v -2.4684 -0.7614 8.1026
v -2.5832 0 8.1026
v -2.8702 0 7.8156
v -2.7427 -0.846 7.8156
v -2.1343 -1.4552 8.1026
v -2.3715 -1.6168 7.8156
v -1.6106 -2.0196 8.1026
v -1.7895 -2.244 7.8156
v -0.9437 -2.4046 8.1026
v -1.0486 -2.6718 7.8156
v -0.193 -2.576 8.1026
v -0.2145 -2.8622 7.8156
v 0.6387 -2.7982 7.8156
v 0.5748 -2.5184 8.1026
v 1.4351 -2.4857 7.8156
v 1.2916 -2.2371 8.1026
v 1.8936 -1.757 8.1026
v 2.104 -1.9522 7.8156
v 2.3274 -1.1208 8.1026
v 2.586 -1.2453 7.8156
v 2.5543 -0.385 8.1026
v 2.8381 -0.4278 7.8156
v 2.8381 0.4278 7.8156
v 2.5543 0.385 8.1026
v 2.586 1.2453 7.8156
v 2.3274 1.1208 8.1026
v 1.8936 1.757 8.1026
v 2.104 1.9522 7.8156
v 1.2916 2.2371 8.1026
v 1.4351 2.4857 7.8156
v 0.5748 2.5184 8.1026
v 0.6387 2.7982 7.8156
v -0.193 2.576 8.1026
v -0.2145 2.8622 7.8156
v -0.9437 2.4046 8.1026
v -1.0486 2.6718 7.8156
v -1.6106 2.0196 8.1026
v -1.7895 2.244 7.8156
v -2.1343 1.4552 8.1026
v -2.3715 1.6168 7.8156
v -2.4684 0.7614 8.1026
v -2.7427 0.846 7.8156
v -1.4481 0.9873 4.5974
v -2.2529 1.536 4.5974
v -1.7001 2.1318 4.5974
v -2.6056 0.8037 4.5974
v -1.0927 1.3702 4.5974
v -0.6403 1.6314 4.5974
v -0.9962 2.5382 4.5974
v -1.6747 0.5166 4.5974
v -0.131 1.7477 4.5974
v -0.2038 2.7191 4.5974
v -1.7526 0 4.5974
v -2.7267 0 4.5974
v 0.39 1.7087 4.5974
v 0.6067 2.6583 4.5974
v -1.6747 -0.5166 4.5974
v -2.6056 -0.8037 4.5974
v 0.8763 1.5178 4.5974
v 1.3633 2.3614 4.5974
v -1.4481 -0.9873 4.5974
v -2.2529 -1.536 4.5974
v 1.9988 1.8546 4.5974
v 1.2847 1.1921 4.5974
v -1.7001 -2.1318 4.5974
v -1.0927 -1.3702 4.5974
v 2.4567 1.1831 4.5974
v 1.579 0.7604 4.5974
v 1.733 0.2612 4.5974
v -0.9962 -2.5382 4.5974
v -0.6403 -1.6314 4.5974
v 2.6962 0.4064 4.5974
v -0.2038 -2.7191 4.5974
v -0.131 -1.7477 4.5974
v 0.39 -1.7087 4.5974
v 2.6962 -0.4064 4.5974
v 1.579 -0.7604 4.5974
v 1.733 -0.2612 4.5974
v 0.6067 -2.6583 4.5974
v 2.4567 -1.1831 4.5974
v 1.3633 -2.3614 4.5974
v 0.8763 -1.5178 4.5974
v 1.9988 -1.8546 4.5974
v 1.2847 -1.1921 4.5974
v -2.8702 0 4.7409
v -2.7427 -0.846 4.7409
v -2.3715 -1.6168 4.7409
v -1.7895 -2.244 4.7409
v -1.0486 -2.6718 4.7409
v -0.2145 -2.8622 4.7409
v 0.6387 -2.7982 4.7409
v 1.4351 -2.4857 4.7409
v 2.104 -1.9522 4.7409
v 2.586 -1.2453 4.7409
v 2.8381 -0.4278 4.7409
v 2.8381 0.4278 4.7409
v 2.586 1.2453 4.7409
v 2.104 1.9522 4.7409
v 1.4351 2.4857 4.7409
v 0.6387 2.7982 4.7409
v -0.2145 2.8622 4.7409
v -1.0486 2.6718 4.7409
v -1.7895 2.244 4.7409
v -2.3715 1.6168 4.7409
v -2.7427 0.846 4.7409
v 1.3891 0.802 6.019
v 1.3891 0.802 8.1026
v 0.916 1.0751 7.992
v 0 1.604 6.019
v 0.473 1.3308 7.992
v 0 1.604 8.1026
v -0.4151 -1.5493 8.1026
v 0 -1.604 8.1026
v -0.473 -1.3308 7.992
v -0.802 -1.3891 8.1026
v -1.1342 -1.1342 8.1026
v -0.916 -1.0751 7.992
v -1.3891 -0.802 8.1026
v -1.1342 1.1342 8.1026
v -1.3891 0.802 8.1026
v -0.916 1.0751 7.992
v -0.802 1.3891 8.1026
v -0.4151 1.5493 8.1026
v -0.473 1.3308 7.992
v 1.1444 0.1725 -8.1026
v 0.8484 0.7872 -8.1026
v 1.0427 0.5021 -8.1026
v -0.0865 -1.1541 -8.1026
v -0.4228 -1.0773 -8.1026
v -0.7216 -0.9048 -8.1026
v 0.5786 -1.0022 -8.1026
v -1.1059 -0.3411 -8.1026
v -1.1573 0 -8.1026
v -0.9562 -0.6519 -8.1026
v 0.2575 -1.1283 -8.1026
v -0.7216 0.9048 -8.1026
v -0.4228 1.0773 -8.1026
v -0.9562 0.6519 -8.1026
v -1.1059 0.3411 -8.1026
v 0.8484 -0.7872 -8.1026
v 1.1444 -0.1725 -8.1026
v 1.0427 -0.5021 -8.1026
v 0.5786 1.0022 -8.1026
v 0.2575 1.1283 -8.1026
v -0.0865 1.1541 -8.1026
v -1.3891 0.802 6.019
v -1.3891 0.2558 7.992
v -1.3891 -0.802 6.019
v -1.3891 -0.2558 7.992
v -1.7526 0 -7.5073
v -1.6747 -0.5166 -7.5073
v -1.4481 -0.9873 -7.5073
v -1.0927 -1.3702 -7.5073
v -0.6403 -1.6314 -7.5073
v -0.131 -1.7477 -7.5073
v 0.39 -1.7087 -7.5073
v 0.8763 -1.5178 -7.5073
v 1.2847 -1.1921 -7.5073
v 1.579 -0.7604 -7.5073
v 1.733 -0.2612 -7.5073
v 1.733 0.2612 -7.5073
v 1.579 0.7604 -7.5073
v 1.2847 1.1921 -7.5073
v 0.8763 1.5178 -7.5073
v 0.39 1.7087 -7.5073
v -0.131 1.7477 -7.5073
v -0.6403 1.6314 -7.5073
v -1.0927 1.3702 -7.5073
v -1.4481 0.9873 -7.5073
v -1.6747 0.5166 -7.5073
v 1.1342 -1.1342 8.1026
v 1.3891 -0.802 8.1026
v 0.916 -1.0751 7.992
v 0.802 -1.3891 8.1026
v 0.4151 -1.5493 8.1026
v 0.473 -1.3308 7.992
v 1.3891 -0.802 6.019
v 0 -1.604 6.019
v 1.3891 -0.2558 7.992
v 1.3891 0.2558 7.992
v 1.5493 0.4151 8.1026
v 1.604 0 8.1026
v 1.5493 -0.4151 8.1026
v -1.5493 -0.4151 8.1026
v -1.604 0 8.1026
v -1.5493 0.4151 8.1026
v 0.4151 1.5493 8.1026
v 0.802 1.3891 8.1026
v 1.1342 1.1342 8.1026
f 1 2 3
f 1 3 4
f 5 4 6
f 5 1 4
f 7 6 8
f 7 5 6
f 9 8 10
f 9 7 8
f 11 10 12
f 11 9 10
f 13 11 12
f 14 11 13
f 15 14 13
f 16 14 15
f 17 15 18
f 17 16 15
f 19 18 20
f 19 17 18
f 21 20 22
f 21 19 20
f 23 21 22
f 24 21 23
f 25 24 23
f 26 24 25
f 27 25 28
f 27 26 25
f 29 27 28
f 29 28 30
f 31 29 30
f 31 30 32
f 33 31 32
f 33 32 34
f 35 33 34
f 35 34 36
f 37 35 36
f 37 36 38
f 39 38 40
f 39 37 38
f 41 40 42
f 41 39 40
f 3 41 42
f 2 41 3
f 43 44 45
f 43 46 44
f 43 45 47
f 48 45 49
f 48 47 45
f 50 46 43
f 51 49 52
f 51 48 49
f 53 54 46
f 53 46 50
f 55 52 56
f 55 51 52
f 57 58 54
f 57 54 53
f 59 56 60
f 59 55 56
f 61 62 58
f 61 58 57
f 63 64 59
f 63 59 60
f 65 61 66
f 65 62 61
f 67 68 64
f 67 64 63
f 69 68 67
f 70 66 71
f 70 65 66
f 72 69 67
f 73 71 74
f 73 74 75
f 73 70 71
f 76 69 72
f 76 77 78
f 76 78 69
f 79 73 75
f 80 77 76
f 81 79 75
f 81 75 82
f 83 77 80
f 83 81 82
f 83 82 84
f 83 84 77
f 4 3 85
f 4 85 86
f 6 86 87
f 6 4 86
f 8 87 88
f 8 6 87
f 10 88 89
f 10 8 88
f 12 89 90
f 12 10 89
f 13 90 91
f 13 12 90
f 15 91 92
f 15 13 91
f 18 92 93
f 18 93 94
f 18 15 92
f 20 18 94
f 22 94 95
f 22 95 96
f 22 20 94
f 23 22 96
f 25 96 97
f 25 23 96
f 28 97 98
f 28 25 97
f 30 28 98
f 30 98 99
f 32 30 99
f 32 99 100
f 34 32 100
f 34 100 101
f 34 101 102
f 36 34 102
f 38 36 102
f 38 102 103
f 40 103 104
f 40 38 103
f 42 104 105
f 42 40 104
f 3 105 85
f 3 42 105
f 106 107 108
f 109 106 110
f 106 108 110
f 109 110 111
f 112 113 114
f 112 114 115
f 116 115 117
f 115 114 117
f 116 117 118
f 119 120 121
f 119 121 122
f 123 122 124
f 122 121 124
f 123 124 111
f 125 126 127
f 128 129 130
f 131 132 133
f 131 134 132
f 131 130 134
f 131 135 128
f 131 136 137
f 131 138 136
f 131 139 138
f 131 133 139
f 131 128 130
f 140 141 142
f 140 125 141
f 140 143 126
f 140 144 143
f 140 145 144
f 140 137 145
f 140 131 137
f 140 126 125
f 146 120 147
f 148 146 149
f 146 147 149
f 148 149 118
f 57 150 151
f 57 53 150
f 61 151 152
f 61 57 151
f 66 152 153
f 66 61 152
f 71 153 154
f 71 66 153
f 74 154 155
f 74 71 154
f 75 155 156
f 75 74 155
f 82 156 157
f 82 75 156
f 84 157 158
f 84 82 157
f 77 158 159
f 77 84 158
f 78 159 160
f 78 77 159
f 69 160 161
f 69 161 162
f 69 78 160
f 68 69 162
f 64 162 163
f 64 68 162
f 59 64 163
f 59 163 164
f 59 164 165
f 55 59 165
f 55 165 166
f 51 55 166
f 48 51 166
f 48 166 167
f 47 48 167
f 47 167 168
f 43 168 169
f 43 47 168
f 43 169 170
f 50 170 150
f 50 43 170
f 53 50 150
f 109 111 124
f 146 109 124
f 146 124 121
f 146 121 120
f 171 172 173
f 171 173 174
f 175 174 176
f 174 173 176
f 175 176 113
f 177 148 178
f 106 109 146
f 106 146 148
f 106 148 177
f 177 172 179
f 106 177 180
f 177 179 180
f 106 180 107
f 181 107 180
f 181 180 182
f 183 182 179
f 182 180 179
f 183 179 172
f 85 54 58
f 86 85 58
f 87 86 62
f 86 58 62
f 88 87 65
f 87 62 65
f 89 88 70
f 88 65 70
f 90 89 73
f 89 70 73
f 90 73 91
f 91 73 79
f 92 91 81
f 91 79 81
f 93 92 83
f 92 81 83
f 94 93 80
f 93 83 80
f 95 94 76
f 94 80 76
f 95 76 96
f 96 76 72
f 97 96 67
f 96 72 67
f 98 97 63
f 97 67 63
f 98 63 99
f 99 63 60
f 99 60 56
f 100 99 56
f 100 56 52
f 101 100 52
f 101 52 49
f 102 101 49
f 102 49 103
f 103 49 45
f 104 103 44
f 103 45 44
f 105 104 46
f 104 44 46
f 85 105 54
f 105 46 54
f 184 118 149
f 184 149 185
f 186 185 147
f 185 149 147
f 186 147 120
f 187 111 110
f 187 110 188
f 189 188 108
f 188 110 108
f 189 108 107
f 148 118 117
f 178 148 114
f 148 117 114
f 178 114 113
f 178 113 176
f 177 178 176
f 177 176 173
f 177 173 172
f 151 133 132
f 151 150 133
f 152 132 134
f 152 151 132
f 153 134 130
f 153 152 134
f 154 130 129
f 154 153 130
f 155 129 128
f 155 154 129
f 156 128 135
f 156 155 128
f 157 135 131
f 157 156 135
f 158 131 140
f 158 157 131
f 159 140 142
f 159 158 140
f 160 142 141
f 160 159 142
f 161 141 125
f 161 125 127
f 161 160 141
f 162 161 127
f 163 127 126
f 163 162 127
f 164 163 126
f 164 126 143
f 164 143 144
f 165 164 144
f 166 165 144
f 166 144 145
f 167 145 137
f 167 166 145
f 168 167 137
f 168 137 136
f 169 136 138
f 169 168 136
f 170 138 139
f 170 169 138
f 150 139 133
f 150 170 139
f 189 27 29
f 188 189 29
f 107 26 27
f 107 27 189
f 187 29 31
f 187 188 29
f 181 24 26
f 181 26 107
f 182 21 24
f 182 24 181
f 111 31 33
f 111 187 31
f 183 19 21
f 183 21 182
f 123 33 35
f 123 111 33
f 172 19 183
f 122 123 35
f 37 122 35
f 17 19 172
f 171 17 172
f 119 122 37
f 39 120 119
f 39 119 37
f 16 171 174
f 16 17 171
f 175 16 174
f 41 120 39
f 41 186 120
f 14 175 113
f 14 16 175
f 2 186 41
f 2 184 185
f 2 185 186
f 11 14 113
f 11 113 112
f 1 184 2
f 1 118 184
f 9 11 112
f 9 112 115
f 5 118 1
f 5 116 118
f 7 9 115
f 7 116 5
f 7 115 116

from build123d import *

# Parameters (mm, degrees)
CUT_EXTRUDE1_DEPTH = 2.08359375
CHAMFER1_SIZE      = 0.28702
CHAMFER2_SIZE      = 0.14351


with BuildPart() as part:
    # Sketch2 → Revolve1 (revolve)
    with BuildSketch(Plane(origin=(0, 0, 0), x_dir=(0, 0, -1), z_dir=(1, 0, 0))):
        Polygon((8.1026, 1.1572875), (7.5072875, 1.7526), (-4.5974, 1.7526), (-4.5974, 2.8702), (-8.1026, 2.8702), (-8.1026, 0), (8.1026, 0), align=None)
    revolve(axis=Axis((0, 0, -8.1026), (0, 0, 1)))

    # Sketch4 → Cut-Extrude1 (cut)
    with BuildSketch(Plane.XY.offset(8.1026)):
        Polygon((0, 1.603951217), (-1.3890625, 0.801975608), (-1.3890625, -0.801975608), (0, -1.603951217), (1.3890625, -0.801975608), (1.3890625, 0.801975608), align=None)
    extrude(amount=-CUT_EXTRUDE1_DEPTH, mode=Mode.SUBTRACT)

    # Cut-Extrude2 cone 1 section (through the dimple's axis) → Cut-Extrude2 (revolve, cut)
    with BuildSketch(Plane(origin=(0, 0, 8.1026), x_dir=(0, -1, 0), z_dir=(1, 0, 0))):
        Polygon((0, 0), (1.603951217, 0), (0, 0.926041667), align=None)
    revolve(axis=Axis((0, 0, 8.1026), (0, 0, -1)), mode=Mode.SUBTRACT)

    # Chamfer1
    chamfer1_edges = [part.edges().sort_by_distance(p)[0] for p in [
        (0, -2.8702, 8.1026),
    ]]
    chamfer(chamfer1_edges, length=CHAMFER1_SIZE)

    # Chamfer2
    chamfer2_edges = [part.edges().sort_by_distance(p)[0] for p in [
        (0, -2.8702, 4.5974),
    ]]
    chamfer(chamfer2_edges, length=CHAMFER2_SIZE)


solid = part.part
